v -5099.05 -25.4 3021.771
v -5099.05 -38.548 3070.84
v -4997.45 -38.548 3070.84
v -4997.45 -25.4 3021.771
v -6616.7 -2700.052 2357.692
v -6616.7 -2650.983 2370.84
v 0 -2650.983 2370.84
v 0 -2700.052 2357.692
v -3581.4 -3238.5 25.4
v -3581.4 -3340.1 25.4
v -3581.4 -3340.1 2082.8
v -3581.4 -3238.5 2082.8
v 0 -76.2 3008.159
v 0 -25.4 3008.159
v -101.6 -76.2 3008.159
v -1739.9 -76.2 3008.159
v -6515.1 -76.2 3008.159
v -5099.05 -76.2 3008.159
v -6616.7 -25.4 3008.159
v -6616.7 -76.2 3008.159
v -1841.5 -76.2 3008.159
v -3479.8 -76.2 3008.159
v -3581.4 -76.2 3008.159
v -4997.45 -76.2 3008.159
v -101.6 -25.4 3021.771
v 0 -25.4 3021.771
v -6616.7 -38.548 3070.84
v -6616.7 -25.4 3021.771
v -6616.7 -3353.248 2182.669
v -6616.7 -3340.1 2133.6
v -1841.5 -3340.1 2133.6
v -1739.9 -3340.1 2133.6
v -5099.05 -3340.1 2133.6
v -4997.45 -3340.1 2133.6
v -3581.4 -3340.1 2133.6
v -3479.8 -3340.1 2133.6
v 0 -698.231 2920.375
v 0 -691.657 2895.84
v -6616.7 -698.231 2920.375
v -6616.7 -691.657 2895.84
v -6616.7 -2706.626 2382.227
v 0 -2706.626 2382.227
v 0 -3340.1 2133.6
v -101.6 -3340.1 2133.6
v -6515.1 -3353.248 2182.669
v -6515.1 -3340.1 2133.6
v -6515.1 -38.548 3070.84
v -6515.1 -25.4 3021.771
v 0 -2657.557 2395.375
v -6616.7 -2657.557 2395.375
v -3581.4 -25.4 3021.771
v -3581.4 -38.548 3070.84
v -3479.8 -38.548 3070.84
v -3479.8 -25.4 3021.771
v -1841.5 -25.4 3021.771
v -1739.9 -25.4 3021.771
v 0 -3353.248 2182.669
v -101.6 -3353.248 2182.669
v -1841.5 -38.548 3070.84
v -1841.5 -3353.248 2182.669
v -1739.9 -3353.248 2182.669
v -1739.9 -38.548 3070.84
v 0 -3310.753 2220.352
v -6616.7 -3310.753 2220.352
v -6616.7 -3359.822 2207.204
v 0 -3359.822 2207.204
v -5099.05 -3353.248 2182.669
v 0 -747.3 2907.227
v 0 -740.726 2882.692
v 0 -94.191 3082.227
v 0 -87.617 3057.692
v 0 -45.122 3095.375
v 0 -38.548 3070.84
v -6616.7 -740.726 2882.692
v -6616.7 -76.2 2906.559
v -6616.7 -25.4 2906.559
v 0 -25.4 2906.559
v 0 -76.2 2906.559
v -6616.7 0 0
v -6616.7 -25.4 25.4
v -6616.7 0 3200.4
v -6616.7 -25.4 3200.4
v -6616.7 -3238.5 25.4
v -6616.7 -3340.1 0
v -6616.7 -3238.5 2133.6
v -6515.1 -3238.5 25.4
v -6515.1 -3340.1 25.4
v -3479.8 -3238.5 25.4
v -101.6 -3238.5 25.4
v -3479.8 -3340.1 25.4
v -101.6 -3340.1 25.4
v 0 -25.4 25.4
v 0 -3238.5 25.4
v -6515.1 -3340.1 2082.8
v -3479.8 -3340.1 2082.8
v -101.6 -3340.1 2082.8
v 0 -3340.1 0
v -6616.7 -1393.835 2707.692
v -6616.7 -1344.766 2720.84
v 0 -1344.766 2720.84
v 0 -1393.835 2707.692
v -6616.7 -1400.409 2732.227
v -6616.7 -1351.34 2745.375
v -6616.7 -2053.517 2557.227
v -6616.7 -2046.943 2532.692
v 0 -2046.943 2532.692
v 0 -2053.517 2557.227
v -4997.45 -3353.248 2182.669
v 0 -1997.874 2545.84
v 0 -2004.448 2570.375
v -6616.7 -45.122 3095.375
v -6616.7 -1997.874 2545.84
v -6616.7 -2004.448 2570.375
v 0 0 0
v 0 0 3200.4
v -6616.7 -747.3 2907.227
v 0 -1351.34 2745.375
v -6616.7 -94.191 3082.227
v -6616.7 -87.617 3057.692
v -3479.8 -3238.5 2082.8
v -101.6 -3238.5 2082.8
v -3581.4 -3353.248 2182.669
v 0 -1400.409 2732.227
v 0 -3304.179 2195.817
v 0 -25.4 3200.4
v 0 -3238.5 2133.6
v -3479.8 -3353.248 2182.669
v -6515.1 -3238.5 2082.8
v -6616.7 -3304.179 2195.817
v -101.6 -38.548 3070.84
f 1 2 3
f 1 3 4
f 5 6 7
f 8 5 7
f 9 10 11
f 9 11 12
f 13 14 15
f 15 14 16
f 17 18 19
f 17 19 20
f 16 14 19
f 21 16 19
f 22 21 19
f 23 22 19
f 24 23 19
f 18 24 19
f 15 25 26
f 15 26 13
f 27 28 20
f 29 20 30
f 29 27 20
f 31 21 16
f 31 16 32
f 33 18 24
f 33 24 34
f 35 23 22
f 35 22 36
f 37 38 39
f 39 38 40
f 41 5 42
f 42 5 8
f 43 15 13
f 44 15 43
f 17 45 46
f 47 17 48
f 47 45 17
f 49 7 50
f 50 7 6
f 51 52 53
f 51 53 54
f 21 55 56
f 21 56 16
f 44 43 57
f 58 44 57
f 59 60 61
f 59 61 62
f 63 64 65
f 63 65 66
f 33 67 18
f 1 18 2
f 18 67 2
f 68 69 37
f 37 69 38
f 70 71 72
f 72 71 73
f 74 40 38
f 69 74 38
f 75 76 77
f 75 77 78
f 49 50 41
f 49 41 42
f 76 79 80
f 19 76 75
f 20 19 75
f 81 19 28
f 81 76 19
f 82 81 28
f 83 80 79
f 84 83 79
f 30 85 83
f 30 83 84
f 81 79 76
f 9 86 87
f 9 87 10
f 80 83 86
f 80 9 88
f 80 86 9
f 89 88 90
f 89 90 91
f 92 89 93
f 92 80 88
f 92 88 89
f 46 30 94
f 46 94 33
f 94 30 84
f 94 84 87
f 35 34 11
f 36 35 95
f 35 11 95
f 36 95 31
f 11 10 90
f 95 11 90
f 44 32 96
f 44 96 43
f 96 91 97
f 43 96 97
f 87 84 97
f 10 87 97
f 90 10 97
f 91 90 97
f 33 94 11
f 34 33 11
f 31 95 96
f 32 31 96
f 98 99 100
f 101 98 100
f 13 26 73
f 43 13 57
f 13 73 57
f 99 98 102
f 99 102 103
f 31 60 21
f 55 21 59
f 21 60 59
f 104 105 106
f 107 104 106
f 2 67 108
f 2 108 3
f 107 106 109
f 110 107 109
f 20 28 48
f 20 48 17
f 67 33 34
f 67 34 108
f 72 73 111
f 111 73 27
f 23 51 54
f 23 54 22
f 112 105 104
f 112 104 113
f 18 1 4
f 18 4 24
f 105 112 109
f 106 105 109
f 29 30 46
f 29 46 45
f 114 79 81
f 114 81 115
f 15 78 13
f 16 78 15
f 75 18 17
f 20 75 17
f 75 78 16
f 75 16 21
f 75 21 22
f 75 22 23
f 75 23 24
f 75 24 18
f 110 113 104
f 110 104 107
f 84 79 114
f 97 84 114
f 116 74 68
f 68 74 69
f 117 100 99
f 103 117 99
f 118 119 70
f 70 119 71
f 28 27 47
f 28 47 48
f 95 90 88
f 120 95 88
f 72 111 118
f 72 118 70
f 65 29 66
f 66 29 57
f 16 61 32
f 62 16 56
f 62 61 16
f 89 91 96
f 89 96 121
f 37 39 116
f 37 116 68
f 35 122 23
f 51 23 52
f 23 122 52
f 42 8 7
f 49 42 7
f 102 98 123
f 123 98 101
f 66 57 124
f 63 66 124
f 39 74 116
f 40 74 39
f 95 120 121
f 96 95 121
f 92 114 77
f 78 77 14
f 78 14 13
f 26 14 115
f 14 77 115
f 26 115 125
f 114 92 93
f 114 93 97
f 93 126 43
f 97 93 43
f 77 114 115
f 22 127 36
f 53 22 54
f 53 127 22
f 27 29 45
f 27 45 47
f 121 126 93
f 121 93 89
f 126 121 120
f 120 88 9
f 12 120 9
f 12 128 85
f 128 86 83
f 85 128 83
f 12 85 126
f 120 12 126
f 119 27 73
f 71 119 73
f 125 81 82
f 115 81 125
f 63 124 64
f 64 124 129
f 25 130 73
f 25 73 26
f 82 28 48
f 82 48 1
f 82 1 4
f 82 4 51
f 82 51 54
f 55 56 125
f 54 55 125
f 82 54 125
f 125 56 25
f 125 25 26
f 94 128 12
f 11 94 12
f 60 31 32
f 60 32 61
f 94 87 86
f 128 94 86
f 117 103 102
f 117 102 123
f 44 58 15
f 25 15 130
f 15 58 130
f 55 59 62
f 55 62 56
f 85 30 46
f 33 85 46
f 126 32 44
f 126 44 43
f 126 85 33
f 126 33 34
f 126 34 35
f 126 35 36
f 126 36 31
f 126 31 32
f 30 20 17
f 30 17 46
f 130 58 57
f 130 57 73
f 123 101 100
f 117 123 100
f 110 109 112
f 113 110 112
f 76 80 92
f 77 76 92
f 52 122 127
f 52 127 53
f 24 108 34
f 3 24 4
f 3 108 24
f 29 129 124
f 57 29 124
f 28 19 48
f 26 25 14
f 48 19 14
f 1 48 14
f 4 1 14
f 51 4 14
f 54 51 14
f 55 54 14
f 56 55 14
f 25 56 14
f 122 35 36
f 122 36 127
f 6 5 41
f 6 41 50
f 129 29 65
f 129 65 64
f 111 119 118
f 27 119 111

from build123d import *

# Parameters (mm, degrees)
F0_W      = 6616.7
F0_H      = 3340.1
F1_DEPTH  = 25.4
F2_W      = 6616.7
F2_H      = 25.4
F3_DEPTH  = 3175
F4_W      = 101.6
F4_H      = 101.6
F5_DEPTH  = 2057.4
F6_W      = 101.6
F6_H      = 101.6
F6_W_2    = 6515.1
F7_DEPTH  = 50.8
F8_W      = 50.8
F8_H      = 101.6
F9_DEPTH  = 6616.7
F10_W     = 1416.05
F10_H     = 3431.6299552053
F10_W_2   = 1638.3
F11_DEPTH = 50.8
F12_W     = 101.6
F12_H     = 50.8
F12_W_2   = 6515.1
F13_DEPTH = 25.4


with BuildPart() as f1:
    # F0 (on Top) → F1 (new body)
    with BuildSketch(Plane.XY):
        with Locations((-3308.35, -1670.05)):
            Rectangle(F0_W, F0_H)
    extrude(amount=F1_DEPTH)

    # F2 (on face) → F3 (join)
    with BuildSketch(Plane.XY.offset(25.4)):
        with Locations((-3308.35, -12.7)):
            Rectangle(F2_W, F2_H)
    extrude(amount=F3_DEPTH)

    # F4 (on face) → F5 (join)
    with BuildSketch(Plane.XY.offset(25.4)):
        with Locations((-6565.9, -3289.3)):
            Rectangle(F4_W, F4_H)
        with Locations((-3530.6, -3289.3)):
            Rectangle(F4_W, F4_H)
        with Locations((-50.8, -3289.3)):
            Rectangle(F4_W, F4_H)
    extrude(amount=F5_DEPTH)

    # F6 (on face) → F7 (join)
    with BuildSketch(Plane.XY.offset(2082.8)):
        with Locations((-6565.9, -3289.3)):
            Rectangle(F6_W, F6_H)
        with Locations((-3257.55, -3289.3)):
            Rectangle(F6_W_2, F6_H)
    extrude(amount=F7_DEPTH)

    # F8 (on face) → F9 (join)
    with BuildSketch(Plane(origin=(-6616.7, 0, 0), x_dir=(0, -1, 0), z_dir=(-1, 0, 0))):
        with Locations((50.8, 2957.3593691759)):
            Rectangle(F8_W, F8_H)
        Polygon((25.4, 3021.7711881514), (76.2, 3008.1593691759), (3340.1, 2133.6), (3353.2480074912, 2182.6690319755), (38.5480074912, 3070.8402201269), align=None)
    extrude(amount=-F9_DEPTH)

    # F10 (on face) → F11 (cut)
    with BuildSketch(Plane(origin=(0, -770.292281901, 2874.7699327327), x_dir=(1, 0, 0), z_dir=(0, -0.2588190451, 0.9659258263))):
        with Locations((-5807.075, -958.2575601547)):
            Rectangle(F10_W, F10_H)
        with Locations((-4289.425, -958.2575601547)):
            Rectangle(F10_W, F10_H)
        with Locations((-2660.65, -958.2575601547)):
            Rectangle(F10_W_2, F10_H)
        with Locations((-920.75, -958.2575601547)):
            Rectangle(F10_W_2, F10_H)
    extrude(amount=-F11_DEPTH, mode=Mode.SUBTRACT)


with BuildPart() as f13:
    # F12 (on face) → F13 (new body)
    with BuildSketch(Plane(origin=(0, -770.292281901, 2874.7699327327), x_dir=(1, 0, 0), z_dir=(0, -0.2588190451, 0.9659258263))):
        with Locations((-6565.9, 732.1574174479)):
            Rectangle(F12_W, F12_H)
        with Locations((-3257.55, 732.1574174479)):
            Rectangle(F12_W_2, F12_H)
    extrude(amount=F13_DEPTH)


with BuildPart() as f13b:
    # F12 (on face) → F13, piece 2 (new body)
    with BuildSketch(Plane(origin=(0, -770.292281901, 2874.7699327327), x_dir=(1, 0, 0), z_dir=(0, -0.2588190451, 0.9659258263))):
        with Locations((-6565.9, 56.0094174479)):
            Rectangle(F12_W, F12_H)
        with Locations((-3257.55, 56.0094174479)):
            Rectangle(F12_W_2, F12_H)
    extrude(amount=F13_DEPTH)


with BuildPart() as f13c:
    # F12 (on face) → F13, piece 3 (new body)
    with BuildSketch(Plane(origin=(0, -770.292281901, 2874.7699327327), x_dir=(1, 0, 0), z_dir=(0, -0.2588190451, 0.9659258263))):
        with Locations((-6565.9, -620.1385825521)):
            Rectangle(F12_W, F12_H)
        with Locations((-3257.55, -620.1385825521)):
            Rectangle(F12_W_2, F12_H)
    extrude(amount=F13_DEPTH)


with BuildPart() as f13d:
    # F12 (on face) → F13, piece 4 (new body)
    with BuildSketch(Plane(origin=(0, -770.292281901, 2874.7699327327), x_dir=(1, 0, 0), z_dir=(0, -0.2588190451, 0.9659258263))):
        with Locations((-6565.9, -2648.6725377574)):
            Rectangle(F12_W, F12_H)
        with Locations((-3257.55, -2648.6725377574)):
            Rectangle(F12_W_2, F12_H)
    extrude(amount=F13_DEPTH)


with BuildPart() as f13e:
    # F12 (on face) → F13, piece 5 (new body)
    with BuildSketch(Plane(origin=(0, -770.292281901, 2874.7699327327), x_dir=(1, 0, 0), z_dir=(0, -0.2588190451, 0.9659258263))):
        with Locations((-6565.9, -1972.4345825521)):
            Rectangle(F12_W, F12_H)
        with Locations((-3257.55, -1972.4345825521)):
            Rectangle(F12_W_2, F12_H)
    extrude(amount=F13_DEPTH)


with BuildPart() as f13f:
    # F12 (on face) → F13, piece 6 (new body)
    with BuildSketch(Plane(origin=(0, -770.292281901, 2874.7699327327), x_dir=(1, 0, 0), z_dir=(0, -0.2588190451, 0.9659258263))):
        with Locations((-6565.9, -1296.2865825521)):
            Rectangle(F12_W, F12_H)
        with Locations((-3257.55, -1296.2865825521)):
            Rectangle(F12_W_2, F12_H)
    extrude(amount=F13_DEPTH)


solid = Compound([f1.part, f13.part, f13b.part, f13c.part, f13d.part, f13e.part, f13f.part])
